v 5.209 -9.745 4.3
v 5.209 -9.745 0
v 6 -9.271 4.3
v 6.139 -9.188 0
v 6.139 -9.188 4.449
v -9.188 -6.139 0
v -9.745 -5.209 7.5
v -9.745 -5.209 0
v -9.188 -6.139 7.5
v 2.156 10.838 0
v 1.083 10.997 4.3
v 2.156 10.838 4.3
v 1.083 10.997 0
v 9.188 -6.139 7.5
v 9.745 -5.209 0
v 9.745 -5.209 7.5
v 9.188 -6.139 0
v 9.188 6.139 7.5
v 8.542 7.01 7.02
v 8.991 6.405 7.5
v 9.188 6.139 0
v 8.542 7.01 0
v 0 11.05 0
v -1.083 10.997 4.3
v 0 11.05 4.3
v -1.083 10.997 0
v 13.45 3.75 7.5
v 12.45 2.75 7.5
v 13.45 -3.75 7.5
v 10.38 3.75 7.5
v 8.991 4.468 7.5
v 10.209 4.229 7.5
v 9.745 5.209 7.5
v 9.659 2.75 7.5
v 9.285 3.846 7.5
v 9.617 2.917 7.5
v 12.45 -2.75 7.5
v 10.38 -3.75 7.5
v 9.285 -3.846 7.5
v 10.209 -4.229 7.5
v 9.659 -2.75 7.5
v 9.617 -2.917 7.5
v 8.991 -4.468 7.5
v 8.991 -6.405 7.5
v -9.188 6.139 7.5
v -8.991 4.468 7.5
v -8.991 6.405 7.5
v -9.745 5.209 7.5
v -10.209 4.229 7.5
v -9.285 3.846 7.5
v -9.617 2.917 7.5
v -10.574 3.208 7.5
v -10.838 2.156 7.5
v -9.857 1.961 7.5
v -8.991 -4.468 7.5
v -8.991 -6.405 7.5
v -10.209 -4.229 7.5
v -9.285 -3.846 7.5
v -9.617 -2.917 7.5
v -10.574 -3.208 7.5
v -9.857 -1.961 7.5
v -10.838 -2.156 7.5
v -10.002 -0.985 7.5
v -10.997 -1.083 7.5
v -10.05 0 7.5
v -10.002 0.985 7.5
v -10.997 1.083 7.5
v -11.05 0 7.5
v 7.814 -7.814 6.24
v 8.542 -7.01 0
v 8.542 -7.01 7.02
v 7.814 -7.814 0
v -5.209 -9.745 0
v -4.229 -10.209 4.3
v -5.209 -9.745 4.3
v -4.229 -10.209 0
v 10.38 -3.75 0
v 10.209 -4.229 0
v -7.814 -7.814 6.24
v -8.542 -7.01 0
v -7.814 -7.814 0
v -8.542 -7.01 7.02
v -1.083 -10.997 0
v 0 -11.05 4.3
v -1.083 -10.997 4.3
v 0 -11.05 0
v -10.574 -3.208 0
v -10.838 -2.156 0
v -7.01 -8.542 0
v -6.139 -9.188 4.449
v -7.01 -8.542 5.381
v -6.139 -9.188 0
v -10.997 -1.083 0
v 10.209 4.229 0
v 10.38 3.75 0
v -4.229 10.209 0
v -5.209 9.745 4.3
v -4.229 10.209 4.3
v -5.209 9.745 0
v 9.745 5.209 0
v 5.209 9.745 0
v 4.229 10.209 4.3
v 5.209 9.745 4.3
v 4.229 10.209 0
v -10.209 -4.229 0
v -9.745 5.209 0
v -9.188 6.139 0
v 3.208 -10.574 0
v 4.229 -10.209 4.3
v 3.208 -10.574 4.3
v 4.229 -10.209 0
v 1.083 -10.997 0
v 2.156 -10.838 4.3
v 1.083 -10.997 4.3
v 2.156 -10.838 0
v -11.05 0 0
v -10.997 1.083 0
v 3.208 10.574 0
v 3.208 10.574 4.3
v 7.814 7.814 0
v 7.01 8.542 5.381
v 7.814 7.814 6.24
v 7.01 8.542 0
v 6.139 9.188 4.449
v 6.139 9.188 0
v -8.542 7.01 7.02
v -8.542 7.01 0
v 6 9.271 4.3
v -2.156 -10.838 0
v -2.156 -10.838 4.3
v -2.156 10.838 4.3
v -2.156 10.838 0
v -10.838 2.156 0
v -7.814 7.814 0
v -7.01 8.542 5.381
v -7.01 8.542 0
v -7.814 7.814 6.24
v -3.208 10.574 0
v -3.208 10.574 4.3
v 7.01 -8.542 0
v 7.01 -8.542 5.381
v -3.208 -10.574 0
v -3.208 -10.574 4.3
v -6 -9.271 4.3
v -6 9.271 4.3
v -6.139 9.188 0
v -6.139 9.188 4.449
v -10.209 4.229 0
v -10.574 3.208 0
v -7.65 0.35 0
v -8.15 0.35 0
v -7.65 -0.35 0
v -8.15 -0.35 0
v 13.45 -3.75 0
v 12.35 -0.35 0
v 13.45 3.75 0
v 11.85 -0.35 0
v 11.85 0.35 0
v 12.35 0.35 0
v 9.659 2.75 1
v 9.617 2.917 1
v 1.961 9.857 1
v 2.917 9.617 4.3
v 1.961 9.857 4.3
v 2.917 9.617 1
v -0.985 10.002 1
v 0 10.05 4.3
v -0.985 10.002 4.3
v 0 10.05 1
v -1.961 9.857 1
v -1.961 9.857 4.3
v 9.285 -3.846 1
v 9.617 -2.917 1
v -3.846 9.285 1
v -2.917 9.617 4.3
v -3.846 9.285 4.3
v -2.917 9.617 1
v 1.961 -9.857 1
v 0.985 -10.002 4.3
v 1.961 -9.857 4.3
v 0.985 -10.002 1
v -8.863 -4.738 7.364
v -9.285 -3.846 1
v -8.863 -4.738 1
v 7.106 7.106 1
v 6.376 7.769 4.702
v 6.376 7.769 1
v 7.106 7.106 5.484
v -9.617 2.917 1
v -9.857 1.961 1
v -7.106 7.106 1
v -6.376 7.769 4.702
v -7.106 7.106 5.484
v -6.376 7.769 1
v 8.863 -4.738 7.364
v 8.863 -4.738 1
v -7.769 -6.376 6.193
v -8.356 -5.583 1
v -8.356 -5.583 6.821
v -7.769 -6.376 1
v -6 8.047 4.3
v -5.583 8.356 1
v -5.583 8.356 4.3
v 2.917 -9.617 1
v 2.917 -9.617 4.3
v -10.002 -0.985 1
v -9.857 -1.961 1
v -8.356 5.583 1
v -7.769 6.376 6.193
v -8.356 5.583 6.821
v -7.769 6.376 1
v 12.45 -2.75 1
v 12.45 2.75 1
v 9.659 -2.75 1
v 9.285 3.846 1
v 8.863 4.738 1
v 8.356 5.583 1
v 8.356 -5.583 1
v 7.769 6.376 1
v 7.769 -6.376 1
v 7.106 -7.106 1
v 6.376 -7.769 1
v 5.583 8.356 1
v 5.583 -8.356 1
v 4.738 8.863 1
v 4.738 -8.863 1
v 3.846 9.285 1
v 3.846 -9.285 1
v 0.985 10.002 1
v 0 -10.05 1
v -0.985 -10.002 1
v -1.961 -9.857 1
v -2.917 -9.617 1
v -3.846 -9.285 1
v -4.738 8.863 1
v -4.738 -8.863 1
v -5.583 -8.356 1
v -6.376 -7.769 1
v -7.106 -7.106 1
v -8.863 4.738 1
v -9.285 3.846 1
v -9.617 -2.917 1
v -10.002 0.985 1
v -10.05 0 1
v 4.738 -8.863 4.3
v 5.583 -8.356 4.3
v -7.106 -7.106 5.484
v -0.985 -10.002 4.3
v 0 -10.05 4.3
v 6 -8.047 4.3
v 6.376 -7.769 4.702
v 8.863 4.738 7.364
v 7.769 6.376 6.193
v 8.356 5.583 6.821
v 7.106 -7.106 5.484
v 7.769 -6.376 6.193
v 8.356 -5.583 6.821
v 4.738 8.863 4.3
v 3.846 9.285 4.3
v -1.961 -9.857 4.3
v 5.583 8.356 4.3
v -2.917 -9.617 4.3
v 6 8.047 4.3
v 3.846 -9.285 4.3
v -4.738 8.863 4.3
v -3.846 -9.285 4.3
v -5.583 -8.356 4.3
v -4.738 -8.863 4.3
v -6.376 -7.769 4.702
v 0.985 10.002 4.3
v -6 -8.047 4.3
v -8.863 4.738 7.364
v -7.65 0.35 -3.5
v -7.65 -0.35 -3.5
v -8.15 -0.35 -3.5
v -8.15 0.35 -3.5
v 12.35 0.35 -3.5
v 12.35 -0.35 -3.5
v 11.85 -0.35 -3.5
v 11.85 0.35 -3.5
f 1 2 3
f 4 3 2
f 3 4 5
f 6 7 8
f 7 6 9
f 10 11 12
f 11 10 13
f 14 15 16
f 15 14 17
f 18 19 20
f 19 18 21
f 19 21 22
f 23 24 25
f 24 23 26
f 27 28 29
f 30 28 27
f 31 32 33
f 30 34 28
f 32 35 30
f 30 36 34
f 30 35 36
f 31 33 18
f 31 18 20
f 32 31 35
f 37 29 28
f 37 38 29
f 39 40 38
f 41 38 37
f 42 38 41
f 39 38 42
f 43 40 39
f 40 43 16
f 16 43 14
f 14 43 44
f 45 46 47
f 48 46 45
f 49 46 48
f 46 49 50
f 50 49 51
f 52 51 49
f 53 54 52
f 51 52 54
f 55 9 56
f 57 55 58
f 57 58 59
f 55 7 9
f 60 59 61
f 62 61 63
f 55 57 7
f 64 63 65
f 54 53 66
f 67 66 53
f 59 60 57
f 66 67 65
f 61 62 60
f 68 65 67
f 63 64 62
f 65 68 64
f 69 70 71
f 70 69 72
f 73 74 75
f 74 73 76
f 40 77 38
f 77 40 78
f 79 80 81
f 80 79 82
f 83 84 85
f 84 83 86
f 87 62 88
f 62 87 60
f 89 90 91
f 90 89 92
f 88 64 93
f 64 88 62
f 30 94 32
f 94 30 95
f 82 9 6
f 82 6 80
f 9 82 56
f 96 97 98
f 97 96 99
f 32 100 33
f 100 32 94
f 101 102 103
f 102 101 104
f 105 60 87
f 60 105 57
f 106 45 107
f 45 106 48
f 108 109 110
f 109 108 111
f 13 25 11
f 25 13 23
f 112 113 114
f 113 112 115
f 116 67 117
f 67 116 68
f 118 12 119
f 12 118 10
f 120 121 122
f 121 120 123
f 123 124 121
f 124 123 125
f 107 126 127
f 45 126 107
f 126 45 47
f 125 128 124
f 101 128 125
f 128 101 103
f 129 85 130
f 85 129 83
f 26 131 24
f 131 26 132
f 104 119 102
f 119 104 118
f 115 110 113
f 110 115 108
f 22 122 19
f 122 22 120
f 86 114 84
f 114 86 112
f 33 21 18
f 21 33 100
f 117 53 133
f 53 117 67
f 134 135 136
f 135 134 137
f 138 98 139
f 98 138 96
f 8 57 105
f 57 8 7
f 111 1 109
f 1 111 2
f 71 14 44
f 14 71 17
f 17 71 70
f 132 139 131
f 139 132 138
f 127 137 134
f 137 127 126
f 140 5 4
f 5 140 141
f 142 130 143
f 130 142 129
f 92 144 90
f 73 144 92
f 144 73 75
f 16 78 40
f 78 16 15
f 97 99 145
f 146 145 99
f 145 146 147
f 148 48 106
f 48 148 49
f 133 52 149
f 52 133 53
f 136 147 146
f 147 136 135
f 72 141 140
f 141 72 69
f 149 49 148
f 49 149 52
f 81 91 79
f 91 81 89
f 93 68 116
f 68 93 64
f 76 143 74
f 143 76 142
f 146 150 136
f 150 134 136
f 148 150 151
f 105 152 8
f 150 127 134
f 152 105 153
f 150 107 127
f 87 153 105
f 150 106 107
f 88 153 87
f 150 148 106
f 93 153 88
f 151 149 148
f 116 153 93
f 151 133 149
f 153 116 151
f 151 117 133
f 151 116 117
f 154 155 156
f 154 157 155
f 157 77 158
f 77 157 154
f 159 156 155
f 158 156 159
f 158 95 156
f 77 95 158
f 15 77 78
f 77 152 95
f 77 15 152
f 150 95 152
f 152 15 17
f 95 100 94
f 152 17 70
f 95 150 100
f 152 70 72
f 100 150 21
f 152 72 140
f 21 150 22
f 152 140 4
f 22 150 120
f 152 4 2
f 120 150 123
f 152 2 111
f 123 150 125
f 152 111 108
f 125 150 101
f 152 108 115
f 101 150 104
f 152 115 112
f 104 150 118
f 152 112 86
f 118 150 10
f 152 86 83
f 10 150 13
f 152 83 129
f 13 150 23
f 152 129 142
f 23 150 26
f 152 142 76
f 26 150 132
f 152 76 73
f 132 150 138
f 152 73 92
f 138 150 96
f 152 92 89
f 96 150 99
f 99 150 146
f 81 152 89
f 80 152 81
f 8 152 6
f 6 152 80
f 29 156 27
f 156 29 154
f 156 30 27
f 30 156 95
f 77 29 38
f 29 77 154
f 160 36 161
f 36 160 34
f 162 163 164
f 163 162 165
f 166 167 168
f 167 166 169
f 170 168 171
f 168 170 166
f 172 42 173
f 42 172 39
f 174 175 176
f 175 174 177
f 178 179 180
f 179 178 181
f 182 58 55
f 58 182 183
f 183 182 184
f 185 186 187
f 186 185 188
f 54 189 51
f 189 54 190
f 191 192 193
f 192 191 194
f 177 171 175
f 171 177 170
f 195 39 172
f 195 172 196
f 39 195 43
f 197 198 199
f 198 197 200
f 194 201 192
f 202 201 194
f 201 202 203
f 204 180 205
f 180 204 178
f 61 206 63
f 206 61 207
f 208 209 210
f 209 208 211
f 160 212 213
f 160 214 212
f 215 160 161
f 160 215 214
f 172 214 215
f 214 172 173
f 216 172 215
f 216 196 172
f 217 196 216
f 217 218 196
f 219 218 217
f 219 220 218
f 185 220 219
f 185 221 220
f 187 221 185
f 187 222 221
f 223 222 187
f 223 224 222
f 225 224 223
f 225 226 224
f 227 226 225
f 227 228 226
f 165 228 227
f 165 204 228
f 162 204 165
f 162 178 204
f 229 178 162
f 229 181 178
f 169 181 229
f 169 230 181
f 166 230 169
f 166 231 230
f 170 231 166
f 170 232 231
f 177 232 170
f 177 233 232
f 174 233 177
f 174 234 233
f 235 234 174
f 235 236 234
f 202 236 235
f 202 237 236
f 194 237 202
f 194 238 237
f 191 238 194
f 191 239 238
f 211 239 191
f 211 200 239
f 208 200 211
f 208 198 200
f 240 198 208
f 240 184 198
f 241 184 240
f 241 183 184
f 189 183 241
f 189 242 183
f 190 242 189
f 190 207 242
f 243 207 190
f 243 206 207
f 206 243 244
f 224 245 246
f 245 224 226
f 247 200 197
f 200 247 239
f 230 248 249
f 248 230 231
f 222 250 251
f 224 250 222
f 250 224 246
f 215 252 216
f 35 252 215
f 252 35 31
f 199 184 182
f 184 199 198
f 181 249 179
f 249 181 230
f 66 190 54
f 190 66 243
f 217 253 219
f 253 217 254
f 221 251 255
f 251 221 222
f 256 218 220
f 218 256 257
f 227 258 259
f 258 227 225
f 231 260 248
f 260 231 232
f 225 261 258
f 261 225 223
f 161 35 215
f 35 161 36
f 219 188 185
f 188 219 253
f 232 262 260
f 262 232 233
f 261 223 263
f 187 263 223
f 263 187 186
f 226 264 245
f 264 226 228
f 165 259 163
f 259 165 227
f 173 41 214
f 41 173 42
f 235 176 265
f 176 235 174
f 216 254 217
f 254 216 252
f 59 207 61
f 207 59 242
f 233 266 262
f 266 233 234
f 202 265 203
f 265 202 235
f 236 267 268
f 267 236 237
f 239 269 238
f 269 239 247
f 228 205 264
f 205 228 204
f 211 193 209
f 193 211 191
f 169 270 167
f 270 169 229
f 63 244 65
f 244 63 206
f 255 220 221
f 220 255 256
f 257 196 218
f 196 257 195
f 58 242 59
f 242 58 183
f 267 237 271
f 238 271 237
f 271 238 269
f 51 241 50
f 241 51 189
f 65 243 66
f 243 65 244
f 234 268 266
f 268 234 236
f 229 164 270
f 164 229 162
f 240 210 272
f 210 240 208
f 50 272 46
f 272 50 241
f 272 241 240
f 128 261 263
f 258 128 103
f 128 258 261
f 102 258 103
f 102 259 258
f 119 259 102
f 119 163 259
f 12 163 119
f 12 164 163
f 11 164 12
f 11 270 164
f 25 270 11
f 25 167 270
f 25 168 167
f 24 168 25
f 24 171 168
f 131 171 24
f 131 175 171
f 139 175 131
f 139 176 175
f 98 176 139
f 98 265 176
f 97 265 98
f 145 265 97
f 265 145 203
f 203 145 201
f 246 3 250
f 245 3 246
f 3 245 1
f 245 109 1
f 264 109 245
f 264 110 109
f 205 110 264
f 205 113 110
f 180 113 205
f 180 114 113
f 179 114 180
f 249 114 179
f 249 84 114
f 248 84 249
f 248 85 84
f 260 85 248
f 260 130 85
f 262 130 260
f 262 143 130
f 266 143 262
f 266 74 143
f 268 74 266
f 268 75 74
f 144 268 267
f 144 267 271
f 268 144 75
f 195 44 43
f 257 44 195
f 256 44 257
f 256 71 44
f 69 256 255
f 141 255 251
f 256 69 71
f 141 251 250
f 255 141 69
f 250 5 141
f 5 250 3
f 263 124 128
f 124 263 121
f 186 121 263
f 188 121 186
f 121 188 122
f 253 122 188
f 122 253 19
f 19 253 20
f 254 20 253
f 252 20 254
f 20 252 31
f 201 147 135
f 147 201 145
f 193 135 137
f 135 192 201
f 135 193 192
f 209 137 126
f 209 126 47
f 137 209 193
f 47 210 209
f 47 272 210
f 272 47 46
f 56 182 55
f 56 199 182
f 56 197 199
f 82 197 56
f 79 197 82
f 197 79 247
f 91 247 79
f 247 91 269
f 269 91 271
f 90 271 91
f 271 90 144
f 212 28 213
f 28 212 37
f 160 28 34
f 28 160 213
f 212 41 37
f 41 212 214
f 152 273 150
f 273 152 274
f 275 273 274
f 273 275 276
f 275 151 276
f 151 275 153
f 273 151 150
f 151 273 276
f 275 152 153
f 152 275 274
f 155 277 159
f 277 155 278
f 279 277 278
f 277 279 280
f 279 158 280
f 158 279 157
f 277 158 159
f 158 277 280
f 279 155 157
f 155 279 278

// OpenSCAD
$fn = 64;

difference()
{
	union()
	{
		cylinder(d = 22.1, h = 7.5);
		translate([13.45-4,-7.5/2,0]) cube([4,7.5,7.5]);
	}
	translate([0,0,1]) cylinder(d = 20.1, h = 10);

	hull()
	{
		translate([-6, -20, 4.3]) cube([12, 40, 0.1]);
		translate([-9, -20, 7.51]) cube([18, 40, 0.1]);
	}
	translate([13.45-5,-5.5/2,1]) cube([4,5.5,8.5]);
}

translate([-7.90,0,-3.5/2]) cube([0.5,0.7,3.5], center = true);
translate([12.1,0,-3.5/2]) cube([0.5,0.7,3.5], center = true);
